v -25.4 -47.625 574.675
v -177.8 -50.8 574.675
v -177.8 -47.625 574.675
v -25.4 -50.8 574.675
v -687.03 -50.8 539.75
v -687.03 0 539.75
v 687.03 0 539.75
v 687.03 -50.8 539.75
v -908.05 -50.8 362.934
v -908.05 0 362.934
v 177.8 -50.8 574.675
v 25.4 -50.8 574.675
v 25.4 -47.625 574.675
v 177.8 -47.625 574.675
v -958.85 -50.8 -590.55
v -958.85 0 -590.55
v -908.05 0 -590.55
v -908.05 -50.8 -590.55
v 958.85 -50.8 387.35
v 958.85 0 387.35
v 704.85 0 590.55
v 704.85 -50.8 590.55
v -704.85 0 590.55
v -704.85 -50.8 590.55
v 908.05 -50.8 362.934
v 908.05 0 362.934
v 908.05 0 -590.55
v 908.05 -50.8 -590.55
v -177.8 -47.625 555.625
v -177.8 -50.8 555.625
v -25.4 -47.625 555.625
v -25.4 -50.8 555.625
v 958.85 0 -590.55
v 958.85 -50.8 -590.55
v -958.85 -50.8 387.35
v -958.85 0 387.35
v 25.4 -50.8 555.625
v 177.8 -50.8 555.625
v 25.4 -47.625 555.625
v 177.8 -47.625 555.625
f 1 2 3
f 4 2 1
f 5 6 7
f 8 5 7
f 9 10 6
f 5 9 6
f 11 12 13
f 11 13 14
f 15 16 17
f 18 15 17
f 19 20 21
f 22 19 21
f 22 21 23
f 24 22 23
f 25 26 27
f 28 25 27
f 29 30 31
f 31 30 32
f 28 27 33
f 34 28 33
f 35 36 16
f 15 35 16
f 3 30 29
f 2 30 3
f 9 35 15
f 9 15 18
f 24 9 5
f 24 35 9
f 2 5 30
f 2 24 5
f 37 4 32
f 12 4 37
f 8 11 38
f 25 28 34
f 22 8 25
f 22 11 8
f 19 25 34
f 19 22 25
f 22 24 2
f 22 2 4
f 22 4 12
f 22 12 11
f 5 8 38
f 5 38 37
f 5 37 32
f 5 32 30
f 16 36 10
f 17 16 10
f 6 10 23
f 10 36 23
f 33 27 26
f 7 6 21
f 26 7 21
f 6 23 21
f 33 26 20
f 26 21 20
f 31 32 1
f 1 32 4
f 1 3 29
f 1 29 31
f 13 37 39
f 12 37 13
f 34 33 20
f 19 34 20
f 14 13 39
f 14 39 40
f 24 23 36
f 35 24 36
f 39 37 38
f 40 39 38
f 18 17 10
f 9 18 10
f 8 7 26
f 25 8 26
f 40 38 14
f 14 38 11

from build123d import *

# Parameters (mm, degrees)
F1_DEPTH = 50.8
F2_W     = 152.4
F2_H     = 19.05
F3_DEPTH = 3.175


with BuildPart() as f1:
    # F0 (on Front) → F1 (new body)
    with BuildSketch(Plane.XZ):
        Polygon((958.85, 387.35), (704.85, 590.55), (-704.85, 590.55), (-958.85, 387.35), (-958.85, -590.55), (-908.05, -590.55), (-908.05, 362.934258), (-687.030322, 539.75), (687.030322, 539.75), (908.05, 362.934258), (908.05, -590.55), (958.85, -590.55), align=None)
    extrude(amount=F1_DEPTH)

    # F2 (on face) → F3 (cut)
    with BuildSketch(Plane.XZ.offset(50.8)):
        with Locations((-101.6, 565.15)):
            Rectangle(F2_W, F2_H)
        with Locations((101.6, 565.15)):
            Rectangle(F2_W, F2_H)
    extrude(amount=-F3_DEPTH, mode=Mode.SUBTRACT)


solid = f1.part
